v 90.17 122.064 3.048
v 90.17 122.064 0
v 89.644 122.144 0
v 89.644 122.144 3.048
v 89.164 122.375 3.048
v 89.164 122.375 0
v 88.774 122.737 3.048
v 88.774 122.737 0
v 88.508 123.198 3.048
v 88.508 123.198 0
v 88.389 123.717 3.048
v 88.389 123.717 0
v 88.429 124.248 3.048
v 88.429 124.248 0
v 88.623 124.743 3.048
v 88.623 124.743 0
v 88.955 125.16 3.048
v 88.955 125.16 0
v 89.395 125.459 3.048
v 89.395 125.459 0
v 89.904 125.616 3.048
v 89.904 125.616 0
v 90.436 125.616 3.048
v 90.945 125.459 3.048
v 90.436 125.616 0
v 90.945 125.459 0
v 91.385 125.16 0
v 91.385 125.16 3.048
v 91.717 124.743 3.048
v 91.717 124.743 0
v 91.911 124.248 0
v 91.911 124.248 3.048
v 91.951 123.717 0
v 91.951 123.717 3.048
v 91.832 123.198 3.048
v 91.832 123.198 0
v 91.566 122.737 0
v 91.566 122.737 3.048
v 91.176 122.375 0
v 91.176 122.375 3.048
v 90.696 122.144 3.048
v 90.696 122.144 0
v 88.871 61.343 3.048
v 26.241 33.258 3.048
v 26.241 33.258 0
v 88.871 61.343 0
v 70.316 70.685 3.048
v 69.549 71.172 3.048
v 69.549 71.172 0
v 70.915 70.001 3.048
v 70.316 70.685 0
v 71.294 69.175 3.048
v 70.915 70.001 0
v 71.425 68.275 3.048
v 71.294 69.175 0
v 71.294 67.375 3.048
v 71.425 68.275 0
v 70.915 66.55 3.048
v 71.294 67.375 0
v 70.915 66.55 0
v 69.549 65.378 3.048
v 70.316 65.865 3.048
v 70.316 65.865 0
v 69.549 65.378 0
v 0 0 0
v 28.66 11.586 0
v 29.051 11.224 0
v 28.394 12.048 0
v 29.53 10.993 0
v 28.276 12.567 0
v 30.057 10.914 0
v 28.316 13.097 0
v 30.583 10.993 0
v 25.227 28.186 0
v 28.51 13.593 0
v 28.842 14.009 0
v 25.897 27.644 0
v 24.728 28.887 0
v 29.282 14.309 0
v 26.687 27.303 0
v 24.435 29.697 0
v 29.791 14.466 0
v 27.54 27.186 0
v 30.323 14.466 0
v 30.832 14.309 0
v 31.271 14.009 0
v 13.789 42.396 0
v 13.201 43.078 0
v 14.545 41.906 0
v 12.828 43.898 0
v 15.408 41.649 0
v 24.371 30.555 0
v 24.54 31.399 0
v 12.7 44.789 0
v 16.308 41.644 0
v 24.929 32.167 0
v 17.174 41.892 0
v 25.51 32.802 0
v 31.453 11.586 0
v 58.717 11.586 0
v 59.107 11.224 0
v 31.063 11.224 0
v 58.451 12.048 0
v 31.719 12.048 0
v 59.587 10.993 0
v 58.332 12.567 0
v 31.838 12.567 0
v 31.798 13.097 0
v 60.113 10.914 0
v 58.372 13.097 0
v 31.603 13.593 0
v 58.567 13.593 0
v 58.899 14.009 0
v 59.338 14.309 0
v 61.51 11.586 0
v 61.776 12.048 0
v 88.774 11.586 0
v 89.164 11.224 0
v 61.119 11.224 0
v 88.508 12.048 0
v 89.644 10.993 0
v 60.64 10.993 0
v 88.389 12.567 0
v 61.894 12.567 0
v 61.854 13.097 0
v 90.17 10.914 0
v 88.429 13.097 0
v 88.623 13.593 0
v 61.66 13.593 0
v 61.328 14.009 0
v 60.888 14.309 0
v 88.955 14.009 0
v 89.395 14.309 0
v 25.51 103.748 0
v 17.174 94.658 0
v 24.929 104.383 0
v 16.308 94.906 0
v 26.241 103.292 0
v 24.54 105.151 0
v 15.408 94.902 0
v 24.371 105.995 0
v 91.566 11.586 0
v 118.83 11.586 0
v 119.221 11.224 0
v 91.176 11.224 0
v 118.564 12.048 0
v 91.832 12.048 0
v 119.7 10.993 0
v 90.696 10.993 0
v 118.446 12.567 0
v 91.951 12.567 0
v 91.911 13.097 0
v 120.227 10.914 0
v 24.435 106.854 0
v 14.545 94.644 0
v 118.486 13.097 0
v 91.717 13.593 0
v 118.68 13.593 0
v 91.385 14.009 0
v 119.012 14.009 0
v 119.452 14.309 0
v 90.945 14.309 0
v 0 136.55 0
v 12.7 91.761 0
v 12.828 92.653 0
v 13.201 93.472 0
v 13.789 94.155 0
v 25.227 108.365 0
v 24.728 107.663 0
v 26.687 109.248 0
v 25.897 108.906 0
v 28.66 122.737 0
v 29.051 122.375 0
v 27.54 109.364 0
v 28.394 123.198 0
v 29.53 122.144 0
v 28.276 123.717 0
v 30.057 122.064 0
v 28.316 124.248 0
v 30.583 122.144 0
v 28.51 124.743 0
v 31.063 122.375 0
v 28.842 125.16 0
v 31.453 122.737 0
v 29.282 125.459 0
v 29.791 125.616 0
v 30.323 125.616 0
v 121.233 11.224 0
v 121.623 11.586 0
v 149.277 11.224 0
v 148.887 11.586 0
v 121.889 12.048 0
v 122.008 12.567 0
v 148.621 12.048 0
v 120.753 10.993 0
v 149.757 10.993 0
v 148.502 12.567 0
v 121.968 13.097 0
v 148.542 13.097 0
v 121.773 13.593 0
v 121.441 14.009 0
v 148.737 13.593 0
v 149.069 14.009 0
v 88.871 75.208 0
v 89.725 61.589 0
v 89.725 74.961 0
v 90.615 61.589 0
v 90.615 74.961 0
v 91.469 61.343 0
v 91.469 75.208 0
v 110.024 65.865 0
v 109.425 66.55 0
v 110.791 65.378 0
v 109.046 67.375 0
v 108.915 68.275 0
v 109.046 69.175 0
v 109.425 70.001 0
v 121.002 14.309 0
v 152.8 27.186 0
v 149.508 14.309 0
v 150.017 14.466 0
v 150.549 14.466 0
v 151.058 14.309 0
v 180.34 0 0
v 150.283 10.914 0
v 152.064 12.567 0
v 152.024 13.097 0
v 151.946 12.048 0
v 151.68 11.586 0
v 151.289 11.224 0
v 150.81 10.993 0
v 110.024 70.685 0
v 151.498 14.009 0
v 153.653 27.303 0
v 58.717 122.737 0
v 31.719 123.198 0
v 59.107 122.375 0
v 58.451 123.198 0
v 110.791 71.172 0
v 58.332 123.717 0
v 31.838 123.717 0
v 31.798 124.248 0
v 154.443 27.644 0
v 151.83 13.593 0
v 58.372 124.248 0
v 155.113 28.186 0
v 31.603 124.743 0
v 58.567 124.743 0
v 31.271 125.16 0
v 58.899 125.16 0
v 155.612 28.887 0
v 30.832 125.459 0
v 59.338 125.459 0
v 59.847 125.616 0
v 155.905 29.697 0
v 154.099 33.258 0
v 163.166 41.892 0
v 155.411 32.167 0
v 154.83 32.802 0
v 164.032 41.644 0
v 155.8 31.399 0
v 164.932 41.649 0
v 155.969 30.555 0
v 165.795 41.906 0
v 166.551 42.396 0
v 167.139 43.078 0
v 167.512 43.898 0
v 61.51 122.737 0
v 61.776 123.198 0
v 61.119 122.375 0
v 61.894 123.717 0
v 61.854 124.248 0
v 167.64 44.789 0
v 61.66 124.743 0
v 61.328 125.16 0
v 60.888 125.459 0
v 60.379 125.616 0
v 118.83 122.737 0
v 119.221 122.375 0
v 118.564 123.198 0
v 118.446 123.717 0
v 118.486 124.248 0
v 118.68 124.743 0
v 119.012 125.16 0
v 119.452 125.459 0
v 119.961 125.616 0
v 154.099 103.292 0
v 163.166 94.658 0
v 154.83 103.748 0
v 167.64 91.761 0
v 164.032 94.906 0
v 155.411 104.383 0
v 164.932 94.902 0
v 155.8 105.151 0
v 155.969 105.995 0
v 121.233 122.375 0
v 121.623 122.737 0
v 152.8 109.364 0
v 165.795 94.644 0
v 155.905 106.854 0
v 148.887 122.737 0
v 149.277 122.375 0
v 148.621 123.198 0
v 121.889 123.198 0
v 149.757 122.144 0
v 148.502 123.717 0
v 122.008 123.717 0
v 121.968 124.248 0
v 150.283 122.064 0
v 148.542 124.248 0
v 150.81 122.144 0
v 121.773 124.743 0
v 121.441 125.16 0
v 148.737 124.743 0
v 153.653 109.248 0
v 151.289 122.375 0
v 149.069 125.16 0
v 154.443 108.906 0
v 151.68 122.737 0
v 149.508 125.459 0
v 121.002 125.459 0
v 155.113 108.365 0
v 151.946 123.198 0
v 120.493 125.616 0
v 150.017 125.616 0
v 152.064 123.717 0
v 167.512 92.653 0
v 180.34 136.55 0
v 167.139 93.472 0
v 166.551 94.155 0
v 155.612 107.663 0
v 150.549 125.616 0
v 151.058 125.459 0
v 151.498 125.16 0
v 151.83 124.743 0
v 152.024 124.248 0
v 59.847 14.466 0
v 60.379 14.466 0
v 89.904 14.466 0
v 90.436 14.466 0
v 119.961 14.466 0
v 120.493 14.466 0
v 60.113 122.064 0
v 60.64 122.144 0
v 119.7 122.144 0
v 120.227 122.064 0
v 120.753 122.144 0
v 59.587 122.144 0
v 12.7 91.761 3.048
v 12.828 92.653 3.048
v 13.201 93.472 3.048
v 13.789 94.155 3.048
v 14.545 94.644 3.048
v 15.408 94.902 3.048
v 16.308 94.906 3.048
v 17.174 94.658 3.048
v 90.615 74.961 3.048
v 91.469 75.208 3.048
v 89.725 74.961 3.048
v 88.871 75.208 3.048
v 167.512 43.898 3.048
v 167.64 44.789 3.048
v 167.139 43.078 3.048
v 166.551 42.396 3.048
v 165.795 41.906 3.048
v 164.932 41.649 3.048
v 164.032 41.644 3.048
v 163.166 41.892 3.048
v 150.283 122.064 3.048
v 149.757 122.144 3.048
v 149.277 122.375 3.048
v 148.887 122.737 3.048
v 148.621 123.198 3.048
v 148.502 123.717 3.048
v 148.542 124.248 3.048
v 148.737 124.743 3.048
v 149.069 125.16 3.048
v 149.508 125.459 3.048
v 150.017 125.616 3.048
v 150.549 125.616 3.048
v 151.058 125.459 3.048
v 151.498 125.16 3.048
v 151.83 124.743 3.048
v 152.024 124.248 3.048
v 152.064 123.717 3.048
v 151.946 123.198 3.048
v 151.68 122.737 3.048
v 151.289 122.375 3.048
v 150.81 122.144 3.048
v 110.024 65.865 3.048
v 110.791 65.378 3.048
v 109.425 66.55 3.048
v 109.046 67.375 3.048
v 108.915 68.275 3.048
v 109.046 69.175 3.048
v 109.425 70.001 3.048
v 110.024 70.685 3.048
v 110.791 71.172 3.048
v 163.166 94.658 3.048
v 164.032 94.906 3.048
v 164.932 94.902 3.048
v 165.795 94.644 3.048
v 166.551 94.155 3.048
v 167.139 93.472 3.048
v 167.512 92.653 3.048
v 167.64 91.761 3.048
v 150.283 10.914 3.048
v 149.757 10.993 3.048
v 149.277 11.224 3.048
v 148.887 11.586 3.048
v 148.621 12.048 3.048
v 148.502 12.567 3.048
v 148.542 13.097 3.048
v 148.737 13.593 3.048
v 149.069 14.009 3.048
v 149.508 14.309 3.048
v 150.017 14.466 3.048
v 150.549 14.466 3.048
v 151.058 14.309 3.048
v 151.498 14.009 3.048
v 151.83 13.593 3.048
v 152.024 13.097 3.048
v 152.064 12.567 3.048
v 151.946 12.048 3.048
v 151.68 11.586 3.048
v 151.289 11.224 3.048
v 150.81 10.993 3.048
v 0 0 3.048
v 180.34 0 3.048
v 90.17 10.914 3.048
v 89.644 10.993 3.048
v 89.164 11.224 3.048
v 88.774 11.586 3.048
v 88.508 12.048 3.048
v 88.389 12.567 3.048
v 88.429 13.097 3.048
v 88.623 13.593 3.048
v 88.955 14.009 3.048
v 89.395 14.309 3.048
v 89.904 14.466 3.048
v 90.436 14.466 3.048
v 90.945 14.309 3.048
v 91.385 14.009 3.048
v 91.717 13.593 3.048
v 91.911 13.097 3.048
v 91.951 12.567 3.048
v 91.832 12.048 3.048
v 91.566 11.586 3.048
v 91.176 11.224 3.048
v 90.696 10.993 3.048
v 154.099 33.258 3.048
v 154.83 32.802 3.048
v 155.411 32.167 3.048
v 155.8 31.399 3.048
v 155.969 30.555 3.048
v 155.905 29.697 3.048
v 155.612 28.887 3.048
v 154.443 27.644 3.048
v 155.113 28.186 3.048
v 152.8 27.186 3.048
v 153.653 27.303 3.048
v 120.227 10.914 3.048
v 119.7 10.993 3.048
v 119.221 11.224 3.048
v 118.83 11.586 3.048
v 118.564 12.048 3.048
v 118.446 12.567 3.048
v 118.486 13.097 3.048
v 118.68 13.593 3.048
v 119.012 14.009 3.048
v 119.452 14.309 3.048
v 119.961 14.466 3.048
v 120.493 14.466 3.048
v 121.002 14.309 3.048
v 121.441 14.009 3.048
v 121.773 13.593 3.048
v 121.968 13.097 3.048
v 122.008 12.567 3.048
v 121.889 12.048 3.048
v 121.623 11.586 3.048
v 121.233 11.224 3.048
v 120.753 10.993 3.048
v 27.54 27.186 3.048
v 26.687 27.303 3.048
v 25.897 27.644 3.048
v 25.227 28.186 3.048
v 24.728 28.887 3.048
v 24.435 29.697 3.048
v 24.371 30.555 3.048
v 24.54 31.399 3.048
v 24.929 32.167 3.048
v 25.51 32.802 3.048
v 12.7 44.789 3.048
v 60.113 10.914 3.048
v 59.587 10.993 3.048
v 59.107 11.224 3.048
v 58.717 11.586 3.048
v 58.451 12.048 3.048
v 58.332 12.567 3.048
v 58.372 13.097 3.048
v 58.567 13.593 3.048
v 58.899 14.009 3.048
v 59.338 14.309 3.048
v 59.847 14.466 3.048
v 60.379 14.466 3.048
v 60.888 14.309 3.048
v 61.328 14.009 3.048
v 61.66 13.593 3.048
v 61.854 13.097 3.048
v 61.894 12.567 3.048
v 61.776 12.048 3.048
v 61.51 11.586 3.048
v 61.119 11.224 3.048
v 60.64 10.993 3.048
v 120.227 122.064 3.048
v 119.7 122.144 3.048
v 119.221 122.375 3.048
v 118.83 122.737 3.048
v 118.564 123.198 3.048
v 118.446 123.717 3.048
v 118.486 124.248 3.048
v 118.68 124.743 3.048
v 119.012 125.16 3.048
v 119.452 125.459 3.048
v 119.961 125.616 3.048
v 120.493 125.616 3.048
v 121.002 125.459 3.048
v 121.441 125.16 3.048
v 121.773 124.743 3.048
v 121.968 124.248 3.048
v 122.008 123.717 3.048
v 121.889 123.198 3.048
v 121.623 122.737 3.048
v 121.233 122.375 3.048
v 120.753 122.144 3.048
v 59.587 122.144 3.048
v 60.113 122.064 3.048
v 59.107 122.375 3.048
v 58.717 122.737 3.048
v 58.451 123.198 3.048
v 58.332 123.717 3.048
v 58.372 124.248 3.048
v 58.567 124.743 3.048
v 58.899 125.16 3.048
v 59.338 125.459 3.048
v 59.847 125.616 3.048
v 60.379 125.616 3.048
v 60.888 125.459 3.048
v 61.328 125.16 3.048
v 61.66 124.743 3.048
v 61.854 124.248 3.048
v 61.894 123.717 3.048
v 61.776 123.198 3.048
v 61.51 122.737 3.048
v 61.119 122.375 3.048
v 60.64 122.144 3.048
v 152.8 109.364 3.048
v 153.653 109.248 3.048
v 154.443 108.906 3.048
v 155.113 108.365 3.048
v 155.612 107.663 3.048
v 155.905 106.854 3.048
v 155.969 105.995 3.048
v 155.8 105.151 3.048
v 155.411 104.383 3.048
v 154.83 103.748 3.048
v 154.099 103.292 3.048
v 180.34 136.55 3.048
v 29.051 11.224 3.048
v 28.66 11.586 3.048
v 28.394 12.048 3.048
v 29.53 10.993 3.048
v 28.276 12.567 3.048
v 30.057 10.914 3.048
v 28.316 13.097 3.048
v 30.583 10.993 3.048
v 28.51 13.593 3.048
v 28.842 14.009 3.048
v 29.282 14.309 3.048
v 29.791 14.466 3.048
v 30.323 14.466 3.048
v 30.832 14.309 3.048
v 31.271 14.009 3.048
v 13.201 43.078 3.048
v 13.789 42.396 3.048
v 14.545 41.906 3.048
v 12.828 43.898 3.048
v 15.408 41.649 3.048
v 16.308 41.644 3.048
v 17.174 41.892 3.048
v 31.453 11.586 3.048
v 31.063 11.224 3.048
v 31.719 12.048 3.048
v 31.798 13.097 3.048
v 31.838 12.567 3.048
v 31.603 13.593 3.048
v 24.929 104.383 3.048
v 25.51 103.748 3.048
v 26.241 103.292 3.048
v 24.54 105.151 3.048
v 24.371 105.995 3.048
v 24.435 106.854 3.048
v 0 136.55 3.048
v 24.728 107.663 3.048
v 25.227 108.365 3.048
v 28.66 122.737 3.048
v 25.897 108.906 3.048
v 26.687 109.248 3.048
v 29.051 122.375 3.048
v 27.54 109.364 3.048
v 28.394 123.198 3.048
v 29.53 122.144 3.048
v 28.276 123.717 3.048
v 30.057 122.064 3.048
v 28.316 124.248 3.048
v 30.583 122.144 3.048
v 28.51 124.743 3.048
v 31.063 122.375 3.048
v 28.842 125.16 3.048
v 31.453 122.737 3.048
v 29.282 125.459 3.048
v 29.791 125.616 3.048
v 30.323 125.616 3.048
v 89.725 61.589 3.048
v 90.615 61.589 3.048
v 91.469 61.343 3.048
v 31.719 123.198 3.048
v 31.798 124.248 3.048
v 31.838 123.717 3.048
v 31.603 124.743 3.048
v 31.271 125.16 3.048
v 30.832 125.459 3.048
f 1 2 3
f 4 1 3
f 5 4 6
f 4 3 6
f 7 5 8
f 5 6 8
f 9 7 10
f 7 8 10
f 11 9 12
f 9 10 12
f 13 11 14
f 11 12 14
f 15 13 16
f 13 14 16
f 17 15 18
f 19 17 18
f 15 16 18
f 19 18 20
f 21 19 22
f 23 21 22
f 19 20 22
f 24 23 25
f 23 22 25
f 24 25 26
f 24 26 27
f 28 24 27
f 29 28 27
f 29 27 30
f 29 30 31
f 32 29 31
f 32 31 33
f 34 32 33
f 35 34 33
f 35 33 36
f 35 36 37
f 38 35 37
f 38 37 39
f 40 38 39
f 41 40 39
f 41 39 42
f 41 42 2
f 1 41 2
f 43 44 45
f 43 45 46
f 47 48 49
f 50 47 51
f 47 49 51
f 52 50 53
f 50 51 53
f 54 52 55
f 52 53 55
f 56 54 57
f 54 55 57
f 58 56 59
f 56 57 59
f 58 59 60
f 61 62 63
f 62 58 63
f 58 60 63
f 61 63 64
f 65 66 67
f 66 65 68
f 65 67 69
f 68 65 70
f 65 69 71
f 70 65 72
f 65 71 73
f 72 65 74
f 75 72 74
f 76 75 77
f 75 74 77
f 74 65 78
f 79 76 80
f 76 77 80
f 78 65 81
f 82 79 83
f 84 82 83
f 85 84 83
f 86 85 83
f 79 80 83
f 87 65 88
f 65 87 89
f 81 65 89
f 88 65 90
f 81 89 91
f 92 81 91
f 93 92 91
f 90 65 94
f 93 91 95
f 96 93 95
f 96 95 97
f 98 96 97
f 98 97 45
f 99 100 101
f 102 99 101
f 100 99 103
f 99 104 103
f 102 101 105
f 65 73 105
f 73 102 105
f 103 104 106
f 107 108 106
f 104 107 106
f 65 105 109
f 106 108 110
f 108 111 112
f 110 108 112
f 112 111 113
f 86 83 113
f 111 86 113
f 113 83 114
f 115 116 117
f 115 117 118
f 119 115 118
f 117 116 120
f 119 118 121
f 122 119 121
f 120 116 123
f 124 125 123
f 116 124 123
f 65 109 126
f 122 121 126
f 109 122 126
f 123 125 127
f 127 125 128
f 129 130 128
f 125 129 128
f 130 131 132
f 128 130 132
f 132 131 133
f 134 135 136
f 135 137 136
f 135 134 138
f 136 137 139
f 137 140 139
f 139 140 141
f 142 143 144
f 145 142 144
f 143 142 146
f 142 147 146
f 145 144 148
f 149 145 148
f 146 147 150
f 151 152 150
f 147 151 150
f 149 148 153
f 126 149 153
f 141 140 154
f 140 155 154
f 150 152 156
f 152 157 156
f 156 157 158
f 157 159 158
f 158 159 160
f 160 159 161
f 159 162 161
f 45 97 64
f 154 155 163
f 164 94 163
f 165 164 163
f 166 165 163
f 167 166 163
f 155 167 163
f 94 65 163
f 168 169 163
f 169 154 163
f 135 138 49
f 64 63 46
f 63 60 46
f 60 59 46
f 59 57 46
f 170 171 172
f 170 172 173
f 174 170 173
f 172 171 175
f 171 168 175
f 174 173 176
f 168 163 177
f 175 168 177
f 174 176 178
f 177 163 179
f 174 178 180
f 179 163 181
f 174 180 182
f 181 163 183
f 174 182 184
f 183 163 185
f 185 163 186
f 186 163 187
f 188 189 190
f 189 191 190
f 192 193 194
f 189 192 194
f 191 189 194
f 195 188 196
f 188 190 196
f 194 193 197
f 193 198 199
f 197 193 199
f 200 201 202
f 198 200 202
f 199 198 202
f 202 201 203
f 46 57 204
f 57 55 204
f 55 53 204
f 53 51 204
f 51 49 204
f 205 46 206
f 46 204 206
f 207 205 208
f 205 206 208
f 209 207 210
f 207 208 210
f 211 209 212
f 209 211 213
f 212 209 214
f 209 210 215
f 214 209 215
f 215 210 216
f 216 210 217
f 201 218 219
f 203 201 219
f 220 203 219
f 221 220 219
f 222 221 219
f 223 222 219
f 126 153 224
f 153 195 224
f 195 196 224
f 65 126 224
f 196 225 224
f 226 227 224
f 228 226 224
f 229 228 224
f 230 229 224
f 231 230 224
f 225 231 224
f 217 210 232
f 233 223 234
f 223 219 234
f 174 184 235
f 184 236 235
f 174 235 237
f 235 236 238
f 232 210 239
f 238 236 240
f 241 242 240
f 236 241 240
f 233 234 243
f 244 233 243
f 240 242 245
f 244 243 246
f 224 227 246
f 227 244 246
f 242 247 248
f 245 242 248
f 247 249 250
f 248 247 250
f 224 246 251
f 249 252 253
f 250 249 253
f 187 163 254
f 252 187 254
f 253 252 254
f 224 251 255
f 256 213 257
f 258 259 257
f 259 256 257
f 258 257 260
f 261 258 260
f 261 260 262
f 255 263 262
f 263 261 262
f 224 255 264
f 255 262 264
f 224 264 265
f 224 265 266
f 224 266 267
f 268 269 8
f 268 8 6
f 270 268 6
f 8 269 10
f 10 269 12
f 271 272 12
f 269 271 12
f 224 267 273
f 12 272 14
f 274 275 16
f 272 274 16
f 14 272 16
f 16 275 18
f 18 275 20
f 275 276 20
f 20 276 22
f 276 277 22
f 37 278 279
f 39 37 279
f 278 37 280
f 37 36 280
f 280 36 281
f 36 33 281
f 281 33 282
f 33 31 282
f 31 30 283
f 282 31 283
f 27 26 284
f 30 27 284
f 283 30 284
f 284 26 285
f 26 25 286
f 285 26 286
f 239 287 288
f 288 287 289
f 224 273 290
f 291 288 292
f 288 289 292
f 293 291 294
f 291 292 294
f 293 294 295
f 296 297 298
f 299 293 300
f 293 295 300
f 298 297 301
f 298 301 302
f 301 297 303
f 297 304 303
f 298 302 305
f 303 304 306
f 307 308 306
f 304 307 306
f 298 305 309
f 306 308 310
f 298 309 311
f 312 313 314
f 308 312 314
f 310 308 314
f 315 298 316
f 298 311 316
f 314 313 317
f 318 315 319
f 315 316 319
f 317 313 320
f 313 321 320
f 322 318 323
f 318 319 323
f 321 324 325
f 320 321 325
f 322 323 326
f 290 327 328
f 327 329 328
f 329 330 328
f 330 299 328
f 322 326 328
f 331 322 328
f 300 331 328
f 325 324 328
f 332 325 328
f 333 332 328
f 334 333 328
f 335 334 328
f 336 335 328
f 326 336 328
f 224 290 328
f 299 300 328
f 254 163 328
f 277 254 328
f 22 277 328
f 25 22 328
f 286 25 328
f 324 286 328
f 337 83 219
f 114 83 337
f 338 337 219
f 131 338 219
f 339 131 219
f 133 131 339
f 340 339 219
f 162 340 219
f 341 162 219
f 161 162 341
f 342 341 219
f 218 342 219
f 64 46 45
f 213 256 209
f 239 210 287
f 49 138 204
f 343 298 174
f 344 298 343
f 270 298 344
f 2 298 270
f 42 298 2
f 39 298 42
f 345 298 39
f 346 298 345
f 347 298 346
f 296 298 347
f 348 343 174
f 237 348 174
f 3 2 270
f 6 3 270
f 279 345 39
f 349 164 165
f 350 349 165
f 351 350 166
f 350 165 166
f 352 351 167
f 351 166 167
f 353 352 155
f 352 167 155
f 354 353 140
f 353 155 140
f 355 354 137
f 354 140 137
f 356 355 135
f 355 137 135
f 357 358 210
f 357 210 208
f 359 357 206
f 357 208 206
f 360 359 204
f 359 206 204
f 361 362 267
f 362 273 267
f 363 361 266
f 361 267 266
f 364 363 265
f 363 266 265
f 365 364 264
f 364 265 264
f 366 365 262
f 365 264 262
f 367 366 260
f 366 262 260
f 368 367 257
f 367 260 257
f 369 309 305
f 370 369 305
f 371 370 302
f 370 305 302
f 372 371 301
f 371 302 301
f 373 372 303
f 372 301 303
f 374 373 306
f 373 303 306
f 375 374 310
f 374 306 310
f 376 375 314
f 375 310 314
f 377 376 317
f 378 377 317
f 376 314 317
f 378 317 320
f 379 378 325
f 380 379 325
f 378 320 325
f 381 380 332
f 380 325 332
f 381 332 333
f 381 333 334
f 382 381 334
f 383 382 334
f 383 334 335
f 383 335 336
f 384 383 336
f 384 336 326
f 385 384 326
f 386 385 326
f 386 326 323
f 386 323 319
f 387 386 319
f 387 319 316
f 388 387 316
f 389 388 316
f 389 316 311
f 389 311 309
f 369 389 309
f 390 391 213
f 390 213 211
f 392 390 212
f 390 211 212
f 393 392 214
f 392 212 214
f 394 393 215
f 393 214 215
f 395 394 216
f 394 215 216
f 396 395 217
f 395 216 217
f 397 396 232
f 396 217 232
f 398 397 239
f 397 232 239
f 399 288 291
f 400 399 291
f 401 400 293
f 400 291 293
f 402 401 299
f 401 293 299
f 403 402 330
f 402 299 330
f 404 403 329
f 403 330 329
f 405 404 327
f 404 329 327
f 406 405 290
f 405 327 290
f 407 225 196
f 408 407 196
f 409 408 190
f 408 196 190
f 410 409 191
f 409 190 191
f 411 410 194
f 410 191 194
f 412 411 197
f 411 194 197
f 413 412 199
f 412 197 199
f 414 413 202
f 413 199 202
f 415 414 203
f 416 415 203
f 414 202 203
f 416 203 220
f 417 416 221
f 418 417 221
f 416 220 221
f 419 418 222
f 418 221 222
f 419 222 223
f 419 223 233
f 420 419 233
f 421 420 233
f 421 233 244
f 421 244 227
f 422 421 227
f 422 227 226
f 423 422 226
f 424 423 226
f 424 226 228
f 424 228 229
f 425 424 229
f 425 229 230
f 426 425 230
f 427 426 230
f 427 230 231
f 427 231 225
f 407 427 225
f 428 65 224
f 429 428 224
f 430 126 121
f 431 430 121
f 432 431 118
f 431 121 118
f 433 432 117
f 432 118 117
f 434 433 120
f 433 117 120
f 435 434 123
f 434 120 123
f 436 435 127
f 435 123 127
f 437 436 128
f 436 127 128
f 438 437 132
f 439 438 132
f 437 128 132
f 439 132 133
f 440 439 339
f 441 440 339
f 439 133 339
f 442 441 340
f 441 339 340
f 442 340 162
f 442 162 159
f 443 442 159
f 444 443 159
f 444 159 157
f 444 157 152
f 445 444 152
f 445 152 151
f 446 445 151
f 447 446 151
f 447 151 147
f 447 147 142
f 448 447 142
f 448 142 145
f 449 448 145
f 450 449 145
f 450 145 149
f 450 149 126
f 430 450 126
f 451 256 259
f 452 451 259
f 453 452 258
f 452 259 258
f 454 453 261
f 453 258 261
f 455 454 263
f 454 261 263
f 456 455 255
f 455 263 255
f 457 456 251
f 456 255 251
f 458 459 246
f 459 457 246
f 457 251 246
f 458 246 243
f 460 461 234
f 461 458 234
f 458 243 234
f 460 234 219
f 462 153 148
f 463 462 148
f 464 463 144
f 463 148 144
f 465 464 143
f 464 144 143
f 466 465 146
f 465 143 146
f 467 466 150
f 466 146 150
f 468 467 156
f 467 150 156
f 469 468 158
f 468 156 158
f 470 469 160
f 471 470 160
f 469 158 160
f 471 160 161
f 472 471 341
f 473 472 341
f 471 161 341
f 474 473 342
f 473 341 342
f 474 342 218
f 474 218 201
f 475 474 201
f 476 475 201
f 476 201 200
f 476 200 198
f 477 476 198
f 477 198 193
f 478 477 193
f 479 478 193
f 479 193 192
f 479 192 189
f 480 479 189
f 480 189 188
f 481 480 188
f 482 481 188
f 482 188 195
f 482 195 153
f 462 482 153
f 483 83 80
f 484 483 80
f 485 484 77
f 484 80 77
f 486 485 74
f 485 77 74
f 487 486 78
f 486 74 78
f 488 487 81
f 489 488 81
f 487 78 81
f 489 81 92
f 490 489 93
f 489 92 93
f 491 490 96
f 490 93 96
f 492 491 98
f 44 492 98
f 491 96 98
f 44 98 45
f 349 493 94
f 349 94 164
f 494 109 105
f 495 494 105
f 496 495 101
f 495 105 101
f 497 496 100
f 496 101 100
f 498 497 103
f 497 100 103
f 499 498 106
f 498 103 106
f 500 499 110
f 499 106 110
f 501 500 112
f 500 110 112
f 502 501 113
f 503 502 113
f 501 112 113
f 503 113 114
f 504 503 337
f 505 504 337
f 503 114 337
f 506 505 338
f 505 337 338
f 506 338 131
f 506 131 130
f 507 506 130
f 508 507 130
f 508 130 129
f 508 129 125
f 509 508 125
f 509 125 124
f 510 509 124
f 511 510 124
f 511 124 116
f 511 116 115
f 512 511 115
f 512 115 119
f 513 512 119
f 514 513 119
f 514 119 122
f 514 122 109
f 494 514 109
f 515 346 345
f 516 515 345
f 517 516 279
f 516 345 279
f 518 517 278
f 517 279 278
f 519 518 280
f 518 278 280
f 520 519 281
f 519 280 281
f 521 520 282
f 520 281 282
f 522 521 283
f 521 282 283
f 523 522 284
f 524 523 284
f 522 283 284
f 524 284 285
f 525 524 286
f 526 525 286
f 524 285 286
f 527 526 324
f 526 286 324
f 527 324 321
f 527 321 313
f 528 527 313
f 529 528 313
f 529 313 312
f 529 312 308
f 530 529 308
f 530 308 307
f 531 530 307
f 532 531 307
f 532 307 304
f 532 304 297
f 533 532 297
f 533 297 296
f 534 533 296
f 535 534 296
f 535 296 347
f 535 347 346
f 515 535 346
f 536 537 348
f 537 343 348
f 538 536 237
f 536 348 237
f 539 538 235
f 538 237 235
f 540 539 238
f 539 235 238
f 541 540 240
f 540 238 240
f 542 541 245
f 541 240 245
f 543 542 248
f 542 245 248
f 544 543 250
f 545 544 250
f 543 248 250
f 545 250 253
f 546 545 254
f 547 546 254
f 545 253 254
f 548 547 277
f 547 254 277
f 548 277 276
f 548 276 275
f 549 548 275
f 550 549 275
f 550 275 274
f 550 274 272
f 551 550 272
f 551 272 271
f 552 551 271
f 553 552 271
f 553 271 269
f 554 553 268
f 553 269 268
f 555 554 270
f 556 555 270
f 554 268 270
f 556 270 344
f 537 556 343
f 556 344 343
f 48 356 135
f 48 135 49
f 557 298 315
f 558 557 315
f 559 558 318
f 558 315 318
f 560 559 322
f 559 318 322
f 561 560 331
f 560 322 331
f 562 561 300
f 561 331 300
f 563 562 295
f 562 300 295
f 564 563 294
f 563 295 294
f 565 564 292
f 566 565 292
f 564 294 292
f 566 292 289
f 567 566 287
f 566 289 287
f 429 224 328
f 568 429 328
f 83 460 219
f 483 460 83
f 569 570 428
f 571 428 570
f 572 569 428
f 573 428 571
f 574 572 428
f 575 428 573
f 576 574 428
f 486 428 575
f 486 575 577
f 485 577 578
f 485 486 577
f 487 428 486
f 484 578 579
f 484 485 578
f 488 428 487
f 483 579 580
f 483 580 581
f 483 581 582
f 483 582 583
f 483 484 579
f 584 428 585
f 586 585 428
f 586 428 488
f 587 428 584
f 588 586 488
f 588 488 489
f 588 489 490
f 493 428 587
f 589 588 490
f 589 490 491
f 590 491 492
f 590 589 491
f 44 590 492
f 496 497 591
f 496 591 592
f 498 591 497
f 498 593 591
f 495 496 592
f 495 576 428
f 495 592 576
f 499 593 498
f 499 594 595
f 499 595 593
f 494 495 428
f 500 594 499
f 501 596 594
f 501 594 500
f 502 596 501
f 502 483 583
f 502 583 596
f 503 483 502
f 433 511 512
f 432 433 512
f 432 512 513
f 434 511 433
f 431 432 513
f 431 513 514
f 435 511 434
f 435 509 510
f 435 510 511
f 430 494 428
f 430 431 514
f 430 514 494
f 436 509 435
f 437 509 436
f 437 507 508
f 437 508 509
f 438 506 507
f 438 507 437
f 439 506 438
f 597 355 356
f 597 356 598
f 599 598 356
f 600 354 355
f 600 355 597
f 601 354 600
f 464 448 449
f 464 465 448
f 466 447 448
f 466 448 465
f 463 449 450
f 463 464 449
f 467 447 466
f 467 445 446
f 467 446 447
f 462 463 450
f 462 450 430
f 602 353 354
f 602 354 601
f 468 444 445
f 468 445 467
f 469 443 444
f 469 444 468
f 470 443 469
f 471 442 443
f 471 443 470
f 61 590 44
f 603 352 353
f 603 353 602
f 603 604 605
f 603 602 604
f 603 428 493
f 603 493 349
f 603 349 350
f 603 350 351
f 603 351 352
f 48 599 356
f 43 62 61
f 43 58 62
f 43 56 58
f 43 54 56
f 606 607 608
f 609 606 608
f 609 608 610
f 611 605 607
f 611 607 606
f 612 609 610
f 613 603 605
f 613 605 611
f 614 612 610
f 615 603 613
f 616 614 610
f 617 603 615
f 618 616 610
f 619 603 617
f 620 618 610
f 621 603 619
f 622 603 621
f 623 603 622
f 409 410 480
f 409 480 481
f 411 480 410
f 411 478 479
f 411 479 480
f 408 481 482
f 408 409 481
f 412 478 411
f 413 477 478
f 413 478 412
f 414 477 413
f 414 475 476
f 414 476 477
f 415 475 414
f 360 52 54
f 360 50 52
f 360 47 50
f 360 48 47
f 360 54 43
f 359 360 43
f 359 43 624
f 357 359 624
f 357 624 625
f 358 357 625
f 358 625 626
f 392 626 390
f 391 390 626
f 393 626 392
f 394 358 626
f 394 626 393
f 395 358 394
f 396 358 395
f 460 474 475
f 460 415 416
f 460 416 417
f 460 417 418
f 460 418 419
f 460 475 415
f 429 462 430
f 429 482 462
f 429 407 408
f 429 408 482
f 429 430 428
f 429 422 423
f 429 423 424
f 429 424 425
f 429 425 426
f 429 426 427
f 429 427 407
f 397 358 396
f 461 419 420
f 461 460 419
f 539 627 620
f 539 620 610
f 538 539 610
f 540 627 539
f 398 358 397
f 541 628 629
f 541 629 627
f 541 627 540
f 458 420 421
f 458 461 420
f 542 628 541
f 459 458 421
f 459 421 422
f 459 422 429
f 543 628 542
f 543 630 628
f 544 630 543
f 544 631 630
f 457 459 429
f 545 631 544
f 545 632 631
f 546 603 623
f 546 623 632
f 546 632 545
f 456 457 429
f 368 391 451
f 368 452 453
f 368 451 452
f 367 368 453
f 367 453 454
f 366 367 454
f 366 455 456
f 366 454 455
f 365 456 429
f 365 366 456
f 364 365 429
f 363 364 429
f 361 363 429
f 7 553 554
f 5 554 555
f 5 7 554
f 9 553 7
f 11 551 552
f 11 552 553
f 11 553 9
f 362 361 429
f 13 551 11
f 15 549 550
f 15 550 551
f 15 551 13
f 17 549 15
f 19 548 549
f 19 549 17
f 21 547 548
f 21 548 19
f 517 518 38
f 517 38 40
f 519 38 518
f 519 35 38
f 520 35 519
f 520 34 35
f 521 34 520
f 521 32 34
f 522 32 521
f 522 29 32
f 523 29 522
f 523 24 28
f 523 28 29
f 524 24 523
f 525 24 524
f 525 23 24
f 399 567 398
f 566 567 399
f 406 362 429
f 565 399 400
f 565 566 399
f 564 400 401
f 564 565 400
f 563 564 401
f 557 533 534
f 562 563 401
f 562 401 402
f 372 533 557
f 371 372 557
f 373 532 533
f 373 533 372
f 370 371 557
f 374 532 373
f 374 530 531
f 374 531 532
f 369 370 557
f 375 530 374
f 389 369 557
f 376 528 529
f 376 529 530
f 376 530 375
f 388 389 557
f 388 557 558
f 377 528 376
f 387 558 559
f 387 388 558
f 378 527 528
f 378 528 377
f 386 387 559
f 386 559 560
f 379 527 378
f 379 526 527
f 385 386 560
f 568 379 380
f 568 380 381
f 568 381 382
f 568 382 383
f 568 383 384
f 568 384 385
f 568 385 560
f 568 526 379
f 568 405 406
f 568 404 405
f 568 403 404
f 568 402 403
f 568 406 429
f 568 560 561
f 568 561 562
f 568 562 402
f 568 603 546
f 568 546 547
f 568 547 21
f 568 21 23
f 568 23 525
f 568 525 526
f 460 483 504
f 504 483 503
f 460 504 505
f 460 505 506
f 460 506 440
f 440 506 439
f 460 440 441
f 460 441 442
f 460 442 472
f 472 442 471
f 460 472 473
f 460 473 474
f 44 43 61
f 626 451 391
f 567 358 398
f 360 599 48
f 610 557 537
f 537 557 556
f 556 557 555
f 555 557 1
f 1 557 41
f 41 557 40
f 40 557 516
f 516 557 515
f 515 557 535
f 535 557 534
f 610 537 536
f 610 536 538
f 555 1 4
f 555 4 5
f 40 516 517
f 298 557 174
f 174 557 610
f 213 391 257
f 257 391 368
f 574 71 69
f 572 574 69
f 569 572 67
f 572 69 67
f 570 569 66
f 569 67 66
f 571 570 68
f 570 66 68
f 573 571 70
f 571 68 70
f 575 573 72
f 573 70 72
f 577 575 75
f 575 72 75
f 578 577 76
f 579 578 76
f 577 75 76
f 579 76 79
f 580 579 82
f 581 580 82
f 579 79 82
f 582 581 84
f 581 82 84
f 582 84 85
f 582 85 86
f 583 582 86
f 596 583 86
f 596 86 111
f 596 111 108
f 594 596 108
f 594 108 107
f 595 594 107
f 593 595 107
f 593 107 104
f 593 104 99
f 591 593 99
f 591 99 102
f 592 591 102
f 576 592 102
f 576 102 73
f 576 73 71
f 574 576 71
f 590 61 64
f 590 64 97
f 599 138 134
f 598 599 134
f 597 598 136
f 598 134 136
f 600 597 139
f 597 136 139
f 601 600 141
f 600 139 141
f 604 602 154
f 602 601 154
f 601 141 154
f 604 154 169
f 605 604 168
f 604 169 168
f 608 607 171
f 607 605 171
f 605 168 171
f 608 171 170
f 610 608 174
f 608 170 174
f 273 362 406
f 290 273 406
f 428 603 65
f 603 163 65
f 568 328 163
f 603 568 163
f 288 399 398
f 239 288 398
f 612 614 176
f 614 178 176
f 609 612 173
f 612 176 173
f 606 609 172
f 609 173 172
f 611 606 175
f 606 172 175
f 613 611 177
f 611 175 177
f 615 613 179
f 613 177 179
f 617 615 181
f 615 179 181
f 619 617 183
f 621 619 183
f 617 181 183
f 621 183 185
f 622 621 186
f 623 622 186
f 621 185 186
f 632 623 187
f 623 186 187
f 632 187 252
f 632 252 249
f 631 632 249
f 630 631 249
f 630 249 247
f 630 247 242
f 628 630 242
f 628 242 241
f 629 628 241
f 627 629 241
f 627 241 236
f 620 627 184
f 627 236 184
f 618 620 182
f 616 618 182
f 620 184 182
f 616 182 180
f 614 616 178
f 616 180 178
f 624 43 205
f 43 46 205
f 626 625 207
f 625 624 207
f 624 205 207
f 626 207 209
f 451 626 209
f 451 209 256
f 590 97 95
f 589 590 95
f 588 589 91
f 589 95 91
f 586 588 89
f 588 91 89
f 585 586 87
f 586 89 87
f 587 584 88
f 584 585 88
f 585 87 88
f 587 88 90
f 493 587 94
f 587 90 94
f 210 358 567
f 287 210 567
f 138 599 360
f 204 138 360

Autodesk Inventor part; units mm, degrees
ref_plane "YZ Plane" through (0, 0, 0) normal (1, 0, 0) x (0, 1, 0)
ref_plane "XZ Plane" through (0, 0, 0) normal (0, 1, 0) x (-1, 0, 0)
ref_plane "XY Plane" through (0, 0, 0) normal (0, 0, 1) x (1, 0, 0)
sketch "profile sketch" plane through (0, 0, 0) normal (0, 0, 1) x (1, 0, 0)
  line L0 (0, 0) -> (180.34, 0)
  line L1 (180.34, 0) -> (180.34, 136.5504)
  line L2 (180.34, 136.5504) -> (0, 136.5504)
  line L3 (0, 136.5504) -> (0, 0)
  dimension "d5" = 180.34
  dimension "d6" = 136.5504
extrude "Plate1" add sketch "profile sketch" along normal blind 3.048
sketch "rv_hole_sketch" plane through (0, 0, 3.048) normal (0, 0, 1) x (1, 0, 0)
  line L0 (0, 136.5504) -> (0, 0) construction
  line L1 (180.34, 0) -> (180.34, 136.5504) construction
  line L2 (0, 136.5504) -> (180.34, 136.5504) construction
  line L3 (180.34, 0) -> (0, 0) construction
  line L4 (0, 123.8504) -> (30.0567, 123.8504) construction
  line L5 (30.0567, 123.8504) -> (60.1133, 123.8504) construction
  line L6 (60.1133, 123.8504) -> (90.17, 123.8504) construction
  line L7 (90.17, 123.8504) -> (120.2267, 123.8504) construction
  line L8 (120.2267, 123.8504) -> (150.2833, 123.8504) construction
  line L9 (150.2833, 123.8504) -> (180.34, 123.8504) construction
  line L10 (0, 12.7) -> (30.0567, 12.7) construction
  line L11 (30.0567, 12.7) -> (60.1133, 12.7) construction
  line L12 (60.1133, 12.7) -> (90.17, 12.7) construction
  line L13 (90.17, 12.7) -> (120.2267, 12.7) construction
  line L14 (120.2267, 12.7) -> (150.2833, 12.7) construction
  line L15 (150.2833, 12.7) -> (180.34, 12.7) construction
  dimension "d10" = 12.7
  dimension "d11" = 12.7
hole "rv_holes" at (30.0567, 123.8504, 3.048) at (60.1133, 123.8504, 3.048) at (90.17, 123.8504, 3.048) at (120.2267, 123.8504, 3.048) at (150.2833, 123.8504, 3.048) at (150.2833, 12.7, 3.048) at (120.2267, 12.7, 3.048) at (90.17, 12.7, 3.048) at (60.1133, 12.7, 3.048) at (30.0567, 12.7, 3.048) direction (0, 0, -1) diameter 3.5719 depth 3.048 tip angle 118
sketch "cutout_sketch" plane through (0, 0, 3.048) normal (0, 0, 1) x (1, 0, 0)
  line L0 (12.7, 109.3645) -> (90.17, 74.6252)
  line L1 (90.17, 74.6252) -> (167.64, 109.3645)
  line L2 (167.64, 109.3645) -> (12.7, 109.3645)
  line L3 (12.7, 27.1859) -> (90.17, 61.9252)
  line L4 (90.17, 61.9252) -> (167.64, 27.1859)
  line L5 (167.64, 27.1859) -> (12.7, 27.1859)
  circle A0 centre (90.17, 123.8504) radius 1.7859 projected
  circle A1 centre (90.17, 12.7) radius 1.7859 projected
  line L6 (0, 0) -> (0, 136.5504) projected
  line L7 (180.34, 136.5504) -> (180.34, 0) projected
  line L8 (90.17, 74.6252) -> (90.17, 61.9252) construction
  line L9 (12.7, 96.6645) -> (76.0092, 68.2752)
  line L10 (76.0092, 68.2752) -> (12.7, 39.8859)
  line L11 (12.7, 39.8859) -> (12.7, 96.6645)
  line L12 (167.64, 96.6645) -> (104.3308, 68.2752)
  line L13 (104.3308, 68.2752) -> (167.64, 39.8859)
  line L14 (167.64, 39.8859) -> (167.64, 96.6645)
  line L15 (167.64, 109.3645) -> (167.64, 27.1859) construction
  line L16 (12.7, 109.3645) -> (12.7, 27.1859) construction
  dimension "d36" = 12.7
  dimension "d37" = 12.7
  dimension "d38" = 12.7
  dimension "d39" = 12.7
  dimension "d40" = 12.7
  dimension "d41" = 12.7
  dimension "d42" = 12.7
  dimension "d43" = 12.7
extrude "Cut2" cut sketch "cutout_sketch" against normal blind 3.048 contours L2 L1 L0 | L3 L4 L5 | L9 L10 L11 | L14 L13 L12
fillet "Corner Round3" radius 3.175 12 edges at (12.7, 109.3645, 1.524) (167.64, 109.3645, 1.524) (90.17, 74.6252, 1.524) (12.7, 39.8859, 1.524) (12.7, 96.6645, 1.524) (76.0092, 68.2752, 1.524) (90.17, 61.9252, 1.524) (12.7, 27.1859, 1.524) (167.64, 27.1859, 1.524) (104.3308, 68.2752, 1.524) (167.64, 96.6645, 1.524) (167.64, 39.8859, 1.524)
equation "\"d5\" = bh_length"
equation "\"d6\" = bp_height"
equation "\"d10\" = 0.5 * cb_outer_diameter"
equation "\"d11\" = 0.5 * cb_outer_diameter"
equation "\"d12\" = rv_hole_diameter"
equation "\"d17\" = Thickness"
equation "\"d36\" = cmp_mounting_margins"
equation "\"d37\" = cmp_mounting_margins"
equation "\"d38\" = cmp_mounting_margins"
equation "\"d39\" = cmp_mounting_margins"
equation "\"d40\" = cmp_mounting_margins"
equation "\"d41\" = cmp_mounting_margins"
equation "\"d42\" = cmp_mounting_margins"
equation "\"d43\" = cmp_mounting_margins"
equation "\"d44\" = Thickness"
equation "\"d46\" = spd_fillet_size"
equation "\"BendRadius\" = Thickness"
equation "\"BendReliefWidth\" = Thickness"
equation "\"BendReliefDepth\" = 0.5 * Thickness"
equation "\"CornerReliefSize\" = 4 * Thickness"
equation "\"MinimumRemnant\" = 2 * Thickness"
equation "\"TransitionRadius\" = BendRadius"
equation "\"JacobiRadiusSize\" = BendRadius"
equation "\"GapSize\" = Thickness"
equation "\"bh_width\" = 87.63"
equation "\"bh_length\" = 180.34"
equation "\"bh_height\" = bp_height - cb_outer_diameter"
equation "\"bh_metal_width\" = 1.5875"
equation "\"cpn_diameter\" = 69.85"
equation "\"cpn_length\" = 311.15"
equation "\"cmp_foot_seperation_long\" = 139.954"
equation "\"cmp_foot_seperation_short\" = 36.068"
equation "\"cmp_mounting_margins\" = 12.7"
equation "\"cmp_foot_bolt_diameter\" = 6.35"
equation "\"spd_fillet_size\" = 3.175"
equation "\"bp_height\" = gb_mh_seperation + st_outer_diameter"
equation "\"bp_tensioner_width\" = 6.35"
equation "\"bp_tensioner_height\" = 50.8"
equation "\"bp_tensioner_wood_mount_from_tensioner_top\" = 12.7"
equation "\"bp_tensioner_wood_mount_diameter\" = 6.35"
equation "\"cb_outer_diameter\" = 25.4"
equation "\"cb_wall_thickness\" = 1.5875"
equation "\"cb_length\" = 457.2"
equation "\"pdb_mounting_holes_short\" = 104.394"
equation "\"cb_pdb_low_mount_offset\" = 16.0782"
equation "\"pdb_mounting_holes_long\" = 182.2704"
equation "\"pdb_ziptie_hole_diameter\" = 6.35"
equation "\"gb_mh_seperation\" = 111.1504"
equation "\"gb_mh_diameter\" = 6.35"
equation "\"gb_axle_from_edge\" = 38.1"
equation "\"gb_width\" = 127"
equation "\"gb_bearing_diameter\" = 28.575"
equation "\"gb_to_bottom_of_side_assembly\" = 4.7752"
equation "\"ncbt_rivet_row_length\" = 114.3"
equation "\"rv_hole_diameter\" = 3.57187"
equation "\"st_outer_diameter\" = 25.4"
equation "\"st_wall_thickness\" = 1.5875"
equation "\"st_length\" = 685.8"
equation "\"st_gbmh_from_center\" = 55.5752"
equation "\"st_cutout_depth_right\" = 203.2"
equation "\"st_cutout_depth_left\" = 203.2"
equation "\"st_rivet_distance\" = 19.05"
equation "\"so_inner_diameter\" = 7.62"
equation "\"so_wall_thickness\" = 5.08"
equation "\"so_length\" = 40.64"
equation "\"twb_width\" = st_outer_diameter"
equation "\"twb_length\" = bp_tensioner_width + 2 * twb_margin_on_each_side"
equation "\"twb_height\" = 2 * bp_tensioner_wood_mount_diameter + bp_tensioner_height + 2 * bp_tensioner_wood_mount_from_tensioner_top + twb_margin_on_each_side"
equation "\"twb_margin_on_each_side\" = 6.35"
equation "\"twb_tensioner_from_edge\" = -0.5 * bp_tensioner_height + 0.5 * twb_height"
equation "\"tb_rivet_row_length\" = 127"
equation "\"bp_thickness\" = 3.048"
equation "\"bp_width\" = 76.2"
equation "\"bp_axle_height\" = 45.1612"
equation "\"magic_axle_offset\" = 2.286"
equation "\"bp_tensioner_from_bottom\" = 38.1"
equation "\"bp_tensioner_from_side\" = 25.4"
equation "\"d7\" = BendRadius"
equation "\"bh_alternate_height\" = 25.4"
equation "\"bh_alternate_width\" = 81.28"
equation "\"tb_metal_thickness\" = 3.048"
equation "\"tb_hm_mounting_slot_length\" = 40.64"
equation "\"gb_mh_seperation_alt\" = 111.125"
equation "\"gb_axle_from_edge_alt\" = 43.1546"
equation "\"bp_axle_height_alt\" = 50.2158"
equation "\"pdb_mount_include\" = 0"
equation "\"Thickness\" = 3.048"
properties part number "cross_structural_plate(csp)" material "Aluminum 6061"
